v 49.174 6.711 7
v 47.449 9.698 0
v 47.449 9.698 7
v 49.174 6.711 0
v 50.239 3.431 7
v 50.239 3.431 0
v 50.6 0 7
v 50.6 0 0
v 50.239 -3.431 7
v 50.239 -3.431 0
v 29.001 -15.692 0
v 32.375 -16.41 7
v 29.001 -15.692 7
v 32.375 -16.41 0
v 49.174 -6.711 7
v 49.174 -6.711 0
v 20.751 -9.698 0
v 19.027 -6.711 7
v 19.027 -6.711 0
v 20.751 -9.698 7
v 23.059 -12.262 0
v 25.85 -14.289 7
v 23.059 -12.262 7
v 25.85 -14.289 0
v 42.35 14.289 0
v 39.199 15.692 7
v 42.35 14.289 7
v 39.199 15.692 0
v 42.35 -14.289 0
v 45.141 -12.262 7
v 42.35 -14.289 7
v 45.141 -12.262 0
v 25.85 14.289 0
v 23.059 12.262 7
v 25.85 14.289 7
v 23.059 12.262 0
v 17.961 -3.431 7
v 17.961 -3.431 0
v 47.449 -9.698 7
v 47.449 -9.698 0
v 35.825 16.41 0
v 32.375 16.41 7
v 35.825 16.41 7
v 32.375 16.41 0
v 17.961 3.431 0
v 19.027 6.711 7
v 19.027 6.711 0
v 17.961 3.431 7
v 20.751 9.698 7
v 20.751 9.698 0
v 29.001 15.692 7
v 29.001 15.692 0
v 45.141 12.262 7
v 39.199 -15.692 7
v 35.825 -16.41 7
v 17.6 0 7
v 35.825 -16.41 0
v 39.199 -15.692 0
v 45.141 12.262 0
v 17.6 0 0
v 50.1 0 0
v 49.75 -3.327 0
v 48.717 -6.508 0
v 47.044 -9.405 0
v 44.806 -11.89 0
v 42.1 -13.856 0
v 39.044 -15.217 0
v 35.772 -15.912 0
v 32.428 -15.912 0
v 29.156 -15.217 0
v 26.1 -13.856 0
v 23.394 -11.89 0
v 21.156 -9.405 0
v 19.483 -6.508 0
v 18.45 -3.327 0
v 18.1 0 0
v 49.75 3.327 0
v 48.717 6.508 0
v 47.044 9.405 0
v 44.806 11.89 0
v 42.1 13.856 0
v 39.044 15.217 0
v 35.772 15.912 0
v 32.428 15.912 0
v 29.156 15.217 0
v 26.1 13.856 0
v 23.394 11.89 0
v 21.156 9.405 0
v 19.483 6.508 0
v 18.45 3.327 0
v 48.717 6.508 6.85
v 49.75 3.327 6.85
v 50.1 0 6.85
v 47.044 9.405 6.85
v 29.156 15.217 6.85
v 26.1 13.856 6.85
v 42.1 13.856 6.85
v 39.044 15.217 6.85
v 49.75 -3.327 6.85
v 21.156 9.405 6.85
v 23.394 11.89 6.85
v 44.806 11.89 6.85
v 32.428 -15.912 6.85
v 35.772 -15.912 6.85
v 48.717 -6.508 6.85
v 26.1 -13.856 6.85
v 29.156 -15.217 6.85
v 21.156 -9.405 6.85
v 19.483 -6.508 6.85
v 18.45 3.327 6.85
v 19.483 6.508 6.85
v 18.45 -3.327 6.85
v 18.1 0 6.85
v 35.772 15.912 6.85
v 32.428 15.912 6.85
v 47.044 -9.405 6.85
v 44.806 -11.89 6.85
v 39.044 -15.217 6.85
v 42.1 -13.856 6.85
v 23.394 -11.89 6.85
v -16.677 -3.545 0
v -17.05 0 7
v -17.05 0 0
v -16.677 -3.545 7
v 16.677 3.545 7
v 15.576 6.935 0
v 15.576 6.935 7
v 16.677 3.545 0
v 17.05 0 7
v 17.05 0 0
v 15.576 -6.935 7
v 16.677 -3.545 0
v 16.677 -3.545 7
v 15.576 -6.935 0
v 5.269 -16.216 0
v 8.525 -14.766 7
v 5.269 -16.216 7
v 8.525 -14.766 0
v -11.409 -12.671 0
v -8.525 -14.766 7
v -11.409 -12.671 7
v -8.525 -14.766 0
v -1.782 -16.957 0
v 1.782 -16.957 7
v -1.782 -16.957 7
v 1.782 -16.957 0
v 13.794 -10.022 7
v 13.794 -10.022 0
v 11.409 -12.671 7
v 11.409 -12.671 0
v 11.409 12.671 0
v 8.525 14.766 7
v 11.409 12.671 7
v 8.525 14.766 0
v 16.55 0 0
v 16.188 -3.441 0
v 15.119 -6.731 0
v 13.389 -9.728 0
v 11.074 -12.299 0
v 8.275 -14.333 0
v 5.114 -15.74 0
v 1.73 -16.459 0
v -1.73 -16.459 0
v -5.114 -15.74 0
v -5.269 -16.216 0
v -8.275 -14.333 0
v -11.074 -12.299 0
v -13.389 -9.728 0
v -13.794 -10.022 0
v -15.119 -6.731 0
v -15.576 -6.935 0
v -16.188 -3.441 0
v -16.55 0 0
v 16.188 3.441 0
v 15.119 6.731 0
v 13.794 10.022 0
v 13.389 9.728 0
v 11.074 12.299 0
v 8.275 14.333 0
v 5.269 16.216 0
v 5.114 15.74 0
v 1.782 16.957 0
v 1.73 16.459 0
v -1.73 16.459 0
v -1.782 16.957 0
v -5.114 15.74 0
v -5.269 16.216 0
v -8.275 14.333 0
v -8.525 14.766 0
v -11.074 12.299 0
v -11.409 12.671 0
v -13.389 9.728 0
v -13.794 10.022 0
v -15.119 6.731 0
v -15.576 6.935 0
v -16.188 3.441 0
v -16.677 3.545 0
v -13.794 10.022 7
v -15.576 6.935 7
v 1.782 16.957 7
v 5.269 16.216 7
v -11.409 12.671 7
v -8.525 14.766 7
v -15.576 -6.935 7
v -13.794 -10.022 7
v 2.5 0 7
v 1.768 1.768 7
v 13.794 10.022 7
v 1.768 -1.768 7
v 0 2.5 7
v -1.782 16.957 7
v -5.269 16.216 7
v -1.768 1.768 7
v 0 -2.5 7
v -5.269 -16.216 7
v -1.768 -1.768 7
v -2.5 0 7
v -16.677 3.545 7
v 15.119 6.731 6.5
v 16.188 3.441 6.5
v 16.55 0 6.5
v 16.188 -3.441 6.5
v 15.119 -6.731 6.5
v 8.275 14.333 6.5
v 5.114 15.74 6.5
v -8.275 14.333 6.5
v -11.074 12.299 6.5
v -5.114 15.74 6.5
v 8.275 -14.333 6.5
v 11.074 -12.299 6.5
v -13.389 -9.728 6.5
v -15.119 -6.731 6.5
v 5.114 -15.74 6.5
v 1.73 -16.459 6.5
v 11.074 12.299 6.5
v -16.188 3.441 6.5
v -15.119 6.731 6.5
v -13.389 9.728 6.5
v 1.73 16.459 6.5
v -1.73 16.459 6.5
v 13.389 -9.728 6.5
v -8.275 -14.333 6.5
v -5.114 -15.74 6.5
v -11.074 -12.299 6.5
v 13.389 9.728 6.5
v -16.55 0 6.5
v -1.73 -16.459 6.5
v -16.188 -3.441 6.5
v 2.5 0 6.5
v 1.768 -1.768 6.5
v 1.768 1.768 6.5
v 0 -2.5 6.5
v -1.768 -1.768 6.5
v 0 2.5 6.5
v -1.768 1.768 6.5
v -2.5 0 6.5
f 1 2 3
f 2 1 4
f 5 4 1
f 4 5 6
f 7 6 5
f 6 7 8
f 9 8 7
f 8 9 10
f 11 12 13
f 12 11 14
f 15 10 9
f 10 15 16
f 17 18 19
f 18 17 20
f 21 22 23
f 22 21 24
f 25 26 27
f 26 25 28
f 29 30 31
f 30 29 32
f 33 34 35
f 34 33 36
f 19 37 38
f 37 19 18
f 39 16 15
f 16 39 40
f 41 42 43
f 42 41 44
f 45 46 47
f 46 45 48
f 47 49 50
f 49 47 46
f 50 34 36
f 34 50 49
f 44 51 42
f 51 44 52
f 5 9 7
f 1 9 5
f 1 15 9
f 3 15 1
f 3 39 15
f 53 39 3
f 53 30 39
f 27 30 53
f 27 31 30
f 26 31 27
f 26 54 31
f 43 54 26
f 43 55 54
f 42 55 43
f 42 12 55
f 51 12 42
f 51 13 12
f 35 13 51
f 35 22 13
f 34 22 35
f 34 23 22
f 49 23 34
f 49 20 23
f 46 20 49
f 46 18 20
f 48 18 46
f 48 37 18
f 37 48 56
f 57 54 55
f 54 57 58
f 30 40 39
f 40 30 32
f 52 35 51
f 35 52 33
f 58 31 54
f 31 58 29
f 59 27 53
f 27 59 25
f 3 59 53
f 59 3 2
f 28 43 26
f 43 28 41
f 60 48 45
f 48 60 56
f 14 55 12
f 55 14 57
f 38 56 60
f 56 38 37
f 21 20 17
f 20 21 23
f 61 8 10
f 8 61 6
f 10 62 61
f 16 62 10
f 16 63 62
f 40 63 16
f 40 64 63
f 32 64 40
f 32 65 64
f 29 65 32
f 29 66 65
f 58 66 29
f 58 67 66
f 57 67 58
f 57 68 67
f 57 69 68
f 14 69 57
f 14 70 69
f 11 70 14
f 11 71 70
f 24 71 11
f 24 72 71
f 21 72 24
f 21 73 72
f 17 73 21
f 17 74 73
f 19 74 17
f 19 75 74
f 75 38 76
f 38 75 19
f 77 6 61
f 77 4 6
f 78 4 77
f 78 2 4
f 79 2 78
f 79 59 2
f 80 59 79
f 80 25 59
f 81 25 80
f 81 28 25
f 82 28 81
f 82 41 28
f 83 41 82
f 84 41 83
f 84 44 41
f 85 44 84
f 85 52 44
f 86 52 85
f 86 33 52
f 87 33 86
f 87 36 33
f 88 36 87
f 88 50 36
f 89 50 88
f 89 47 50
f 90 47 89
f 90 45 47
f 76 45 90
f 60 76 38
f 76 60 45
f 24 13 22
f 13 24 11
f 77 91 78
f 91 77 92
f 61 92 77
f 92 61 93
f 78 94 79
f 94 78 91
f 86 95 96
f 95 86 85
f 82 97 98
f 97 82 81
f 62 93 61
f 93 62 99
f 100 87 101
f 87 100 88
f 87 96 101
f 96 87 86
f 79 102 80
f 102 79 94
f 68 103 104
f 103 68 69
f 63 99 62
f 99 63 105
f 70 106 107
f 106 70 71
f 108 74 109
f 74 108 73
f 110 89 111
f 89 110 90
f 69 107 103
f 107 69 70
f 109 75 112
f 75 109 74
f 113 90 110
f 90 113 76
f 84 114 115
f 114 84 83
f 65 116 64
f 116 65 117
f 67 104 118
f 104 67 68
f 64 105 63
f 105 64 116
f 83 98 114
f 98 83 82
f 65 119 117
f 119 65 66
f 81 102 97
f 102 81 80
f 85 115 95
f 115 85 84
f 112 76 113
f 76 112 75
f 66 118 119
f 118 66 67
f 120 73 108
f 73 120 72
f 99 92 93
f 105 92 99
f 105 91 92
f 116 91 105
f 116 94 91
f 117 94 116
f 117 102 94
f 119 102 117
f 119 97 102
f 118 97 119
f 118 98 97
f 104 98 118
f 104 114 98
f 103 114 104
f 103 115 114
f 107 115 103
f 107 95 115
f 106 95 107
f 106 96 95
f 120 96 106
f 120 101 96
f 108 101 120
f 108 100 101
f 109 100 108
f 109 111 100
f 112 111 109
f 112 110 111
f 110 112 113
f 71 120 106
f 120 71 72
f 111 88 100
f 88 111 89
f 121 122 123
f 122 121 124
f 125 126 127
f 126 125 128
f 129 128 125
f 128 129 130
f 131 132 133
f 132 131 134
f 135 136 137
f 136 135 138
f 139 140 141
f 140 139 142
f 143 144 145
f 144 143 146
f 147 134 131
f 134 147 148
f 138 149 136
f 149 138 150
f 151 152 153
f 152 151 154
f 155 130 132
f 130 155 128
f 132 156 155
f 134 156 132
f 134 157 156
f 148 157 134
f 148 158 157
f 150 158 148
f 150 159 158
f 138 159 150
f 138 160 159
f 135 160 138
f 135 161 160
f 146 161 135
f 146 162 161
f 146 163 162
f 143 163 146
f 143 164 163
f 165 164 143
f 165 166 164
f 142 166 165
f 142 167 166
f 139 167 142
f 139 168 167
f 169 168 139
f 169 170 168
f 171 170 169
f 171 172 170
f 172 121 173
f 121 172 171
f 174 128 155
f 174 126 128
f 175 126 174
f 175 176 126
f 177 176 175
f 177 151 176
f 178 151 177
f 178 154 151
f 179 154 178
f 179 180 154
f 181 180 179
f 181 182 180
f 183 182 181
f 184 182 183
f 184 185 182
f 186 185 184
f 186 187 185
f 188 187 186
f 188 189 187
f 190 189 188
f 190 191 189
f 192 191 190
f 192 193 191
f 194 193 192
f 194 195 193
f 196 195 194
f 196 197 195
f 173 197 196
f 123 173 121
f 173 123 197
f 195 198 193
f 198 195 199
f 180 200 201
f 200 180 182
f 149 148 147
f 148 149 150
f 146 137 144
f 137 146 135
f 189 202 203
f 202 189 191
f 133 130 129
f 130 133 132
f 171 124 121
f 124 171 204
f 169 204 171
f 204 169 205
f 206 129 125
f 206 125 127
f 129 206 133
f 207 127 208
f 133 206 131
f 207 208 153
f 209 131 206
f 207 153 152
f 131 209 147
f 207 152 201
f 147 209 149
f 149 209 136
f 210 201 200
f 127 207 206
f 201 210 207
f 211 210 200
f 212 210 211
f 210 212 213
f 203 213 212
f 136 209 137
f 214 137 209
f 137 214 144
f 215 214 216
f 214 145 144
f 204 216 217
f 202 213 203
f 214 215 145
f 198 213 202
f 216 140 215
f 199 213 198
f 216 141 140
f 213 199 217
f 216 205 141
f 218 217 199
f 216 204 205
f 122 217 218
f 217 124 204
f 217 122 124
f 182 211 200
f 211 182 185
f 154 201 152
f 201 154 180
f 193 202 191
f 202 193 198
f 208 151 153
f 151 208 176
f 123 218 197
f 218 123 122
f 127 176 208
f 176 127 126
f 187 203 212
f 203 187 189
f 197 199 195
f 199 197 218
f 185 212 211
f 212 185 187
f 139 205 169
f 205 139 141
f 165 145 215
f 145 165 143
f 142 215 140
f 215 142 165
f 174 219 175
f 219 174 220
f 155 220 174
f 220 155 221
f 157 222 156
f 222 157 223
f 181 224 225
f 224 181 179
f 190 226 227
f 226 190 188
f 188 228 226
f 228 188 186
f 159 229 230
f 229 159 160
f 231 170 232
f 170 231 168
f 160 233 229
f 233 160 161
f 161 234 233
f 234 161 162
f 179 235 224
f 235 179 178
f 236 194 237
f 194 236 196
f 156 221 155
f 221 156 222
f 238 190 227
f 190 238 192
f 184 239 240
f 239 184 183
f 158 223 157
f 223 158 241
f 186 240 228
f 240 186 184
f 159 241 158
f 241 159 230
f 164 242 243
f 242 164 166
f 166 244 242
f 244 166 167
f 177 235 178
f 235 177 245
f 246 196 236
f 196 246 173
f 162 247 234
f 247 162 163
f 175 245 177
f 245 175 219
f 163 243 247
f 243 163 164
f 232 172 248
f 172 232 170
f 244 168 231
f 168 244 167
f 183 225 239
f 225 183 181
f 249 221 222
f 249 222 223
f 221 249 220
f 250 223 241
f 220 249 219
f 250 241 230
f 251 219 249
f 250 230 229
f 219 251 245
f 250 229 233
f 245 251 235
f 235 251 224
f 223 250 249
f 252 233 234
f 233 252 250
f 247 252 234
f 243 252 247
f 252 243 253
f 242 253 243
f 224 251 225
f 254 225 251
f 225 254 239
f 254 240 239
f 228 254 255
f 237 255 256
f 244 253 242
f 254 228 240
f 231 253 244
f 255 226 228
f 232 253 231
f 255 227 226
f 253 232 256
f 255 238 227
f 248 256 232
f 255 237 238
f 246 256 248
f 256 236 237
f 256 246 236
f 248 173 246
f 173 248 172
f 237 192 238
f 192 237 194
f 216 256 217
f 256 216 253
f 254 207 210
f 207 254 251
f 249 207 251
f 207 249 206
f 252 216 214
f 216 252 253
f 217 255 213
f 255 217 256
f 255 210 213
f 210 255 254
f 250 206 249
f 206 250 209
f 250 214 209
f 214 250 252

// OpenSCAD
bottom_wall = 0.15;
wall = 1;
top_wall = 0.5;

top_h = 7;
bottom_top_diff = 0;
bottom_h = top_h - bottom_top_diff;

bottom_cup_id = 32;
bottom_cup_od = bottom_cup_id + wall;

bottom_top_fit = 0.1;

top_cup_id = bottom_cup_od + bottom_top_fit;
top_cup_od = top_cup_id + wall;

hole_d = 5;


module top_solid() {
  cylinder(h=top_h, d=top_cup_od);

}

module top_cavity() {
  cylinder(h=top_h-top_wall, d=top_cup_id);
}

module bottom_solid() {
  cylinder(h=bottom_h, d=bottom_cup_od);

}

module bottom_cavity() {
  cylinder(h=bottom_h-bottom_wall, d=bottom_cup_id);
}

module top() {
difference() {
  top_solid();
  top_cavity();
  cylinder(h=2*top_h, d=hole_d);
}
}

module bottom() {
difference() {
  bottom_solid();
  bottom_cavity();
}
}

translate([top_cup_od, 0, bottom_top_diff]) bottom();
top();
